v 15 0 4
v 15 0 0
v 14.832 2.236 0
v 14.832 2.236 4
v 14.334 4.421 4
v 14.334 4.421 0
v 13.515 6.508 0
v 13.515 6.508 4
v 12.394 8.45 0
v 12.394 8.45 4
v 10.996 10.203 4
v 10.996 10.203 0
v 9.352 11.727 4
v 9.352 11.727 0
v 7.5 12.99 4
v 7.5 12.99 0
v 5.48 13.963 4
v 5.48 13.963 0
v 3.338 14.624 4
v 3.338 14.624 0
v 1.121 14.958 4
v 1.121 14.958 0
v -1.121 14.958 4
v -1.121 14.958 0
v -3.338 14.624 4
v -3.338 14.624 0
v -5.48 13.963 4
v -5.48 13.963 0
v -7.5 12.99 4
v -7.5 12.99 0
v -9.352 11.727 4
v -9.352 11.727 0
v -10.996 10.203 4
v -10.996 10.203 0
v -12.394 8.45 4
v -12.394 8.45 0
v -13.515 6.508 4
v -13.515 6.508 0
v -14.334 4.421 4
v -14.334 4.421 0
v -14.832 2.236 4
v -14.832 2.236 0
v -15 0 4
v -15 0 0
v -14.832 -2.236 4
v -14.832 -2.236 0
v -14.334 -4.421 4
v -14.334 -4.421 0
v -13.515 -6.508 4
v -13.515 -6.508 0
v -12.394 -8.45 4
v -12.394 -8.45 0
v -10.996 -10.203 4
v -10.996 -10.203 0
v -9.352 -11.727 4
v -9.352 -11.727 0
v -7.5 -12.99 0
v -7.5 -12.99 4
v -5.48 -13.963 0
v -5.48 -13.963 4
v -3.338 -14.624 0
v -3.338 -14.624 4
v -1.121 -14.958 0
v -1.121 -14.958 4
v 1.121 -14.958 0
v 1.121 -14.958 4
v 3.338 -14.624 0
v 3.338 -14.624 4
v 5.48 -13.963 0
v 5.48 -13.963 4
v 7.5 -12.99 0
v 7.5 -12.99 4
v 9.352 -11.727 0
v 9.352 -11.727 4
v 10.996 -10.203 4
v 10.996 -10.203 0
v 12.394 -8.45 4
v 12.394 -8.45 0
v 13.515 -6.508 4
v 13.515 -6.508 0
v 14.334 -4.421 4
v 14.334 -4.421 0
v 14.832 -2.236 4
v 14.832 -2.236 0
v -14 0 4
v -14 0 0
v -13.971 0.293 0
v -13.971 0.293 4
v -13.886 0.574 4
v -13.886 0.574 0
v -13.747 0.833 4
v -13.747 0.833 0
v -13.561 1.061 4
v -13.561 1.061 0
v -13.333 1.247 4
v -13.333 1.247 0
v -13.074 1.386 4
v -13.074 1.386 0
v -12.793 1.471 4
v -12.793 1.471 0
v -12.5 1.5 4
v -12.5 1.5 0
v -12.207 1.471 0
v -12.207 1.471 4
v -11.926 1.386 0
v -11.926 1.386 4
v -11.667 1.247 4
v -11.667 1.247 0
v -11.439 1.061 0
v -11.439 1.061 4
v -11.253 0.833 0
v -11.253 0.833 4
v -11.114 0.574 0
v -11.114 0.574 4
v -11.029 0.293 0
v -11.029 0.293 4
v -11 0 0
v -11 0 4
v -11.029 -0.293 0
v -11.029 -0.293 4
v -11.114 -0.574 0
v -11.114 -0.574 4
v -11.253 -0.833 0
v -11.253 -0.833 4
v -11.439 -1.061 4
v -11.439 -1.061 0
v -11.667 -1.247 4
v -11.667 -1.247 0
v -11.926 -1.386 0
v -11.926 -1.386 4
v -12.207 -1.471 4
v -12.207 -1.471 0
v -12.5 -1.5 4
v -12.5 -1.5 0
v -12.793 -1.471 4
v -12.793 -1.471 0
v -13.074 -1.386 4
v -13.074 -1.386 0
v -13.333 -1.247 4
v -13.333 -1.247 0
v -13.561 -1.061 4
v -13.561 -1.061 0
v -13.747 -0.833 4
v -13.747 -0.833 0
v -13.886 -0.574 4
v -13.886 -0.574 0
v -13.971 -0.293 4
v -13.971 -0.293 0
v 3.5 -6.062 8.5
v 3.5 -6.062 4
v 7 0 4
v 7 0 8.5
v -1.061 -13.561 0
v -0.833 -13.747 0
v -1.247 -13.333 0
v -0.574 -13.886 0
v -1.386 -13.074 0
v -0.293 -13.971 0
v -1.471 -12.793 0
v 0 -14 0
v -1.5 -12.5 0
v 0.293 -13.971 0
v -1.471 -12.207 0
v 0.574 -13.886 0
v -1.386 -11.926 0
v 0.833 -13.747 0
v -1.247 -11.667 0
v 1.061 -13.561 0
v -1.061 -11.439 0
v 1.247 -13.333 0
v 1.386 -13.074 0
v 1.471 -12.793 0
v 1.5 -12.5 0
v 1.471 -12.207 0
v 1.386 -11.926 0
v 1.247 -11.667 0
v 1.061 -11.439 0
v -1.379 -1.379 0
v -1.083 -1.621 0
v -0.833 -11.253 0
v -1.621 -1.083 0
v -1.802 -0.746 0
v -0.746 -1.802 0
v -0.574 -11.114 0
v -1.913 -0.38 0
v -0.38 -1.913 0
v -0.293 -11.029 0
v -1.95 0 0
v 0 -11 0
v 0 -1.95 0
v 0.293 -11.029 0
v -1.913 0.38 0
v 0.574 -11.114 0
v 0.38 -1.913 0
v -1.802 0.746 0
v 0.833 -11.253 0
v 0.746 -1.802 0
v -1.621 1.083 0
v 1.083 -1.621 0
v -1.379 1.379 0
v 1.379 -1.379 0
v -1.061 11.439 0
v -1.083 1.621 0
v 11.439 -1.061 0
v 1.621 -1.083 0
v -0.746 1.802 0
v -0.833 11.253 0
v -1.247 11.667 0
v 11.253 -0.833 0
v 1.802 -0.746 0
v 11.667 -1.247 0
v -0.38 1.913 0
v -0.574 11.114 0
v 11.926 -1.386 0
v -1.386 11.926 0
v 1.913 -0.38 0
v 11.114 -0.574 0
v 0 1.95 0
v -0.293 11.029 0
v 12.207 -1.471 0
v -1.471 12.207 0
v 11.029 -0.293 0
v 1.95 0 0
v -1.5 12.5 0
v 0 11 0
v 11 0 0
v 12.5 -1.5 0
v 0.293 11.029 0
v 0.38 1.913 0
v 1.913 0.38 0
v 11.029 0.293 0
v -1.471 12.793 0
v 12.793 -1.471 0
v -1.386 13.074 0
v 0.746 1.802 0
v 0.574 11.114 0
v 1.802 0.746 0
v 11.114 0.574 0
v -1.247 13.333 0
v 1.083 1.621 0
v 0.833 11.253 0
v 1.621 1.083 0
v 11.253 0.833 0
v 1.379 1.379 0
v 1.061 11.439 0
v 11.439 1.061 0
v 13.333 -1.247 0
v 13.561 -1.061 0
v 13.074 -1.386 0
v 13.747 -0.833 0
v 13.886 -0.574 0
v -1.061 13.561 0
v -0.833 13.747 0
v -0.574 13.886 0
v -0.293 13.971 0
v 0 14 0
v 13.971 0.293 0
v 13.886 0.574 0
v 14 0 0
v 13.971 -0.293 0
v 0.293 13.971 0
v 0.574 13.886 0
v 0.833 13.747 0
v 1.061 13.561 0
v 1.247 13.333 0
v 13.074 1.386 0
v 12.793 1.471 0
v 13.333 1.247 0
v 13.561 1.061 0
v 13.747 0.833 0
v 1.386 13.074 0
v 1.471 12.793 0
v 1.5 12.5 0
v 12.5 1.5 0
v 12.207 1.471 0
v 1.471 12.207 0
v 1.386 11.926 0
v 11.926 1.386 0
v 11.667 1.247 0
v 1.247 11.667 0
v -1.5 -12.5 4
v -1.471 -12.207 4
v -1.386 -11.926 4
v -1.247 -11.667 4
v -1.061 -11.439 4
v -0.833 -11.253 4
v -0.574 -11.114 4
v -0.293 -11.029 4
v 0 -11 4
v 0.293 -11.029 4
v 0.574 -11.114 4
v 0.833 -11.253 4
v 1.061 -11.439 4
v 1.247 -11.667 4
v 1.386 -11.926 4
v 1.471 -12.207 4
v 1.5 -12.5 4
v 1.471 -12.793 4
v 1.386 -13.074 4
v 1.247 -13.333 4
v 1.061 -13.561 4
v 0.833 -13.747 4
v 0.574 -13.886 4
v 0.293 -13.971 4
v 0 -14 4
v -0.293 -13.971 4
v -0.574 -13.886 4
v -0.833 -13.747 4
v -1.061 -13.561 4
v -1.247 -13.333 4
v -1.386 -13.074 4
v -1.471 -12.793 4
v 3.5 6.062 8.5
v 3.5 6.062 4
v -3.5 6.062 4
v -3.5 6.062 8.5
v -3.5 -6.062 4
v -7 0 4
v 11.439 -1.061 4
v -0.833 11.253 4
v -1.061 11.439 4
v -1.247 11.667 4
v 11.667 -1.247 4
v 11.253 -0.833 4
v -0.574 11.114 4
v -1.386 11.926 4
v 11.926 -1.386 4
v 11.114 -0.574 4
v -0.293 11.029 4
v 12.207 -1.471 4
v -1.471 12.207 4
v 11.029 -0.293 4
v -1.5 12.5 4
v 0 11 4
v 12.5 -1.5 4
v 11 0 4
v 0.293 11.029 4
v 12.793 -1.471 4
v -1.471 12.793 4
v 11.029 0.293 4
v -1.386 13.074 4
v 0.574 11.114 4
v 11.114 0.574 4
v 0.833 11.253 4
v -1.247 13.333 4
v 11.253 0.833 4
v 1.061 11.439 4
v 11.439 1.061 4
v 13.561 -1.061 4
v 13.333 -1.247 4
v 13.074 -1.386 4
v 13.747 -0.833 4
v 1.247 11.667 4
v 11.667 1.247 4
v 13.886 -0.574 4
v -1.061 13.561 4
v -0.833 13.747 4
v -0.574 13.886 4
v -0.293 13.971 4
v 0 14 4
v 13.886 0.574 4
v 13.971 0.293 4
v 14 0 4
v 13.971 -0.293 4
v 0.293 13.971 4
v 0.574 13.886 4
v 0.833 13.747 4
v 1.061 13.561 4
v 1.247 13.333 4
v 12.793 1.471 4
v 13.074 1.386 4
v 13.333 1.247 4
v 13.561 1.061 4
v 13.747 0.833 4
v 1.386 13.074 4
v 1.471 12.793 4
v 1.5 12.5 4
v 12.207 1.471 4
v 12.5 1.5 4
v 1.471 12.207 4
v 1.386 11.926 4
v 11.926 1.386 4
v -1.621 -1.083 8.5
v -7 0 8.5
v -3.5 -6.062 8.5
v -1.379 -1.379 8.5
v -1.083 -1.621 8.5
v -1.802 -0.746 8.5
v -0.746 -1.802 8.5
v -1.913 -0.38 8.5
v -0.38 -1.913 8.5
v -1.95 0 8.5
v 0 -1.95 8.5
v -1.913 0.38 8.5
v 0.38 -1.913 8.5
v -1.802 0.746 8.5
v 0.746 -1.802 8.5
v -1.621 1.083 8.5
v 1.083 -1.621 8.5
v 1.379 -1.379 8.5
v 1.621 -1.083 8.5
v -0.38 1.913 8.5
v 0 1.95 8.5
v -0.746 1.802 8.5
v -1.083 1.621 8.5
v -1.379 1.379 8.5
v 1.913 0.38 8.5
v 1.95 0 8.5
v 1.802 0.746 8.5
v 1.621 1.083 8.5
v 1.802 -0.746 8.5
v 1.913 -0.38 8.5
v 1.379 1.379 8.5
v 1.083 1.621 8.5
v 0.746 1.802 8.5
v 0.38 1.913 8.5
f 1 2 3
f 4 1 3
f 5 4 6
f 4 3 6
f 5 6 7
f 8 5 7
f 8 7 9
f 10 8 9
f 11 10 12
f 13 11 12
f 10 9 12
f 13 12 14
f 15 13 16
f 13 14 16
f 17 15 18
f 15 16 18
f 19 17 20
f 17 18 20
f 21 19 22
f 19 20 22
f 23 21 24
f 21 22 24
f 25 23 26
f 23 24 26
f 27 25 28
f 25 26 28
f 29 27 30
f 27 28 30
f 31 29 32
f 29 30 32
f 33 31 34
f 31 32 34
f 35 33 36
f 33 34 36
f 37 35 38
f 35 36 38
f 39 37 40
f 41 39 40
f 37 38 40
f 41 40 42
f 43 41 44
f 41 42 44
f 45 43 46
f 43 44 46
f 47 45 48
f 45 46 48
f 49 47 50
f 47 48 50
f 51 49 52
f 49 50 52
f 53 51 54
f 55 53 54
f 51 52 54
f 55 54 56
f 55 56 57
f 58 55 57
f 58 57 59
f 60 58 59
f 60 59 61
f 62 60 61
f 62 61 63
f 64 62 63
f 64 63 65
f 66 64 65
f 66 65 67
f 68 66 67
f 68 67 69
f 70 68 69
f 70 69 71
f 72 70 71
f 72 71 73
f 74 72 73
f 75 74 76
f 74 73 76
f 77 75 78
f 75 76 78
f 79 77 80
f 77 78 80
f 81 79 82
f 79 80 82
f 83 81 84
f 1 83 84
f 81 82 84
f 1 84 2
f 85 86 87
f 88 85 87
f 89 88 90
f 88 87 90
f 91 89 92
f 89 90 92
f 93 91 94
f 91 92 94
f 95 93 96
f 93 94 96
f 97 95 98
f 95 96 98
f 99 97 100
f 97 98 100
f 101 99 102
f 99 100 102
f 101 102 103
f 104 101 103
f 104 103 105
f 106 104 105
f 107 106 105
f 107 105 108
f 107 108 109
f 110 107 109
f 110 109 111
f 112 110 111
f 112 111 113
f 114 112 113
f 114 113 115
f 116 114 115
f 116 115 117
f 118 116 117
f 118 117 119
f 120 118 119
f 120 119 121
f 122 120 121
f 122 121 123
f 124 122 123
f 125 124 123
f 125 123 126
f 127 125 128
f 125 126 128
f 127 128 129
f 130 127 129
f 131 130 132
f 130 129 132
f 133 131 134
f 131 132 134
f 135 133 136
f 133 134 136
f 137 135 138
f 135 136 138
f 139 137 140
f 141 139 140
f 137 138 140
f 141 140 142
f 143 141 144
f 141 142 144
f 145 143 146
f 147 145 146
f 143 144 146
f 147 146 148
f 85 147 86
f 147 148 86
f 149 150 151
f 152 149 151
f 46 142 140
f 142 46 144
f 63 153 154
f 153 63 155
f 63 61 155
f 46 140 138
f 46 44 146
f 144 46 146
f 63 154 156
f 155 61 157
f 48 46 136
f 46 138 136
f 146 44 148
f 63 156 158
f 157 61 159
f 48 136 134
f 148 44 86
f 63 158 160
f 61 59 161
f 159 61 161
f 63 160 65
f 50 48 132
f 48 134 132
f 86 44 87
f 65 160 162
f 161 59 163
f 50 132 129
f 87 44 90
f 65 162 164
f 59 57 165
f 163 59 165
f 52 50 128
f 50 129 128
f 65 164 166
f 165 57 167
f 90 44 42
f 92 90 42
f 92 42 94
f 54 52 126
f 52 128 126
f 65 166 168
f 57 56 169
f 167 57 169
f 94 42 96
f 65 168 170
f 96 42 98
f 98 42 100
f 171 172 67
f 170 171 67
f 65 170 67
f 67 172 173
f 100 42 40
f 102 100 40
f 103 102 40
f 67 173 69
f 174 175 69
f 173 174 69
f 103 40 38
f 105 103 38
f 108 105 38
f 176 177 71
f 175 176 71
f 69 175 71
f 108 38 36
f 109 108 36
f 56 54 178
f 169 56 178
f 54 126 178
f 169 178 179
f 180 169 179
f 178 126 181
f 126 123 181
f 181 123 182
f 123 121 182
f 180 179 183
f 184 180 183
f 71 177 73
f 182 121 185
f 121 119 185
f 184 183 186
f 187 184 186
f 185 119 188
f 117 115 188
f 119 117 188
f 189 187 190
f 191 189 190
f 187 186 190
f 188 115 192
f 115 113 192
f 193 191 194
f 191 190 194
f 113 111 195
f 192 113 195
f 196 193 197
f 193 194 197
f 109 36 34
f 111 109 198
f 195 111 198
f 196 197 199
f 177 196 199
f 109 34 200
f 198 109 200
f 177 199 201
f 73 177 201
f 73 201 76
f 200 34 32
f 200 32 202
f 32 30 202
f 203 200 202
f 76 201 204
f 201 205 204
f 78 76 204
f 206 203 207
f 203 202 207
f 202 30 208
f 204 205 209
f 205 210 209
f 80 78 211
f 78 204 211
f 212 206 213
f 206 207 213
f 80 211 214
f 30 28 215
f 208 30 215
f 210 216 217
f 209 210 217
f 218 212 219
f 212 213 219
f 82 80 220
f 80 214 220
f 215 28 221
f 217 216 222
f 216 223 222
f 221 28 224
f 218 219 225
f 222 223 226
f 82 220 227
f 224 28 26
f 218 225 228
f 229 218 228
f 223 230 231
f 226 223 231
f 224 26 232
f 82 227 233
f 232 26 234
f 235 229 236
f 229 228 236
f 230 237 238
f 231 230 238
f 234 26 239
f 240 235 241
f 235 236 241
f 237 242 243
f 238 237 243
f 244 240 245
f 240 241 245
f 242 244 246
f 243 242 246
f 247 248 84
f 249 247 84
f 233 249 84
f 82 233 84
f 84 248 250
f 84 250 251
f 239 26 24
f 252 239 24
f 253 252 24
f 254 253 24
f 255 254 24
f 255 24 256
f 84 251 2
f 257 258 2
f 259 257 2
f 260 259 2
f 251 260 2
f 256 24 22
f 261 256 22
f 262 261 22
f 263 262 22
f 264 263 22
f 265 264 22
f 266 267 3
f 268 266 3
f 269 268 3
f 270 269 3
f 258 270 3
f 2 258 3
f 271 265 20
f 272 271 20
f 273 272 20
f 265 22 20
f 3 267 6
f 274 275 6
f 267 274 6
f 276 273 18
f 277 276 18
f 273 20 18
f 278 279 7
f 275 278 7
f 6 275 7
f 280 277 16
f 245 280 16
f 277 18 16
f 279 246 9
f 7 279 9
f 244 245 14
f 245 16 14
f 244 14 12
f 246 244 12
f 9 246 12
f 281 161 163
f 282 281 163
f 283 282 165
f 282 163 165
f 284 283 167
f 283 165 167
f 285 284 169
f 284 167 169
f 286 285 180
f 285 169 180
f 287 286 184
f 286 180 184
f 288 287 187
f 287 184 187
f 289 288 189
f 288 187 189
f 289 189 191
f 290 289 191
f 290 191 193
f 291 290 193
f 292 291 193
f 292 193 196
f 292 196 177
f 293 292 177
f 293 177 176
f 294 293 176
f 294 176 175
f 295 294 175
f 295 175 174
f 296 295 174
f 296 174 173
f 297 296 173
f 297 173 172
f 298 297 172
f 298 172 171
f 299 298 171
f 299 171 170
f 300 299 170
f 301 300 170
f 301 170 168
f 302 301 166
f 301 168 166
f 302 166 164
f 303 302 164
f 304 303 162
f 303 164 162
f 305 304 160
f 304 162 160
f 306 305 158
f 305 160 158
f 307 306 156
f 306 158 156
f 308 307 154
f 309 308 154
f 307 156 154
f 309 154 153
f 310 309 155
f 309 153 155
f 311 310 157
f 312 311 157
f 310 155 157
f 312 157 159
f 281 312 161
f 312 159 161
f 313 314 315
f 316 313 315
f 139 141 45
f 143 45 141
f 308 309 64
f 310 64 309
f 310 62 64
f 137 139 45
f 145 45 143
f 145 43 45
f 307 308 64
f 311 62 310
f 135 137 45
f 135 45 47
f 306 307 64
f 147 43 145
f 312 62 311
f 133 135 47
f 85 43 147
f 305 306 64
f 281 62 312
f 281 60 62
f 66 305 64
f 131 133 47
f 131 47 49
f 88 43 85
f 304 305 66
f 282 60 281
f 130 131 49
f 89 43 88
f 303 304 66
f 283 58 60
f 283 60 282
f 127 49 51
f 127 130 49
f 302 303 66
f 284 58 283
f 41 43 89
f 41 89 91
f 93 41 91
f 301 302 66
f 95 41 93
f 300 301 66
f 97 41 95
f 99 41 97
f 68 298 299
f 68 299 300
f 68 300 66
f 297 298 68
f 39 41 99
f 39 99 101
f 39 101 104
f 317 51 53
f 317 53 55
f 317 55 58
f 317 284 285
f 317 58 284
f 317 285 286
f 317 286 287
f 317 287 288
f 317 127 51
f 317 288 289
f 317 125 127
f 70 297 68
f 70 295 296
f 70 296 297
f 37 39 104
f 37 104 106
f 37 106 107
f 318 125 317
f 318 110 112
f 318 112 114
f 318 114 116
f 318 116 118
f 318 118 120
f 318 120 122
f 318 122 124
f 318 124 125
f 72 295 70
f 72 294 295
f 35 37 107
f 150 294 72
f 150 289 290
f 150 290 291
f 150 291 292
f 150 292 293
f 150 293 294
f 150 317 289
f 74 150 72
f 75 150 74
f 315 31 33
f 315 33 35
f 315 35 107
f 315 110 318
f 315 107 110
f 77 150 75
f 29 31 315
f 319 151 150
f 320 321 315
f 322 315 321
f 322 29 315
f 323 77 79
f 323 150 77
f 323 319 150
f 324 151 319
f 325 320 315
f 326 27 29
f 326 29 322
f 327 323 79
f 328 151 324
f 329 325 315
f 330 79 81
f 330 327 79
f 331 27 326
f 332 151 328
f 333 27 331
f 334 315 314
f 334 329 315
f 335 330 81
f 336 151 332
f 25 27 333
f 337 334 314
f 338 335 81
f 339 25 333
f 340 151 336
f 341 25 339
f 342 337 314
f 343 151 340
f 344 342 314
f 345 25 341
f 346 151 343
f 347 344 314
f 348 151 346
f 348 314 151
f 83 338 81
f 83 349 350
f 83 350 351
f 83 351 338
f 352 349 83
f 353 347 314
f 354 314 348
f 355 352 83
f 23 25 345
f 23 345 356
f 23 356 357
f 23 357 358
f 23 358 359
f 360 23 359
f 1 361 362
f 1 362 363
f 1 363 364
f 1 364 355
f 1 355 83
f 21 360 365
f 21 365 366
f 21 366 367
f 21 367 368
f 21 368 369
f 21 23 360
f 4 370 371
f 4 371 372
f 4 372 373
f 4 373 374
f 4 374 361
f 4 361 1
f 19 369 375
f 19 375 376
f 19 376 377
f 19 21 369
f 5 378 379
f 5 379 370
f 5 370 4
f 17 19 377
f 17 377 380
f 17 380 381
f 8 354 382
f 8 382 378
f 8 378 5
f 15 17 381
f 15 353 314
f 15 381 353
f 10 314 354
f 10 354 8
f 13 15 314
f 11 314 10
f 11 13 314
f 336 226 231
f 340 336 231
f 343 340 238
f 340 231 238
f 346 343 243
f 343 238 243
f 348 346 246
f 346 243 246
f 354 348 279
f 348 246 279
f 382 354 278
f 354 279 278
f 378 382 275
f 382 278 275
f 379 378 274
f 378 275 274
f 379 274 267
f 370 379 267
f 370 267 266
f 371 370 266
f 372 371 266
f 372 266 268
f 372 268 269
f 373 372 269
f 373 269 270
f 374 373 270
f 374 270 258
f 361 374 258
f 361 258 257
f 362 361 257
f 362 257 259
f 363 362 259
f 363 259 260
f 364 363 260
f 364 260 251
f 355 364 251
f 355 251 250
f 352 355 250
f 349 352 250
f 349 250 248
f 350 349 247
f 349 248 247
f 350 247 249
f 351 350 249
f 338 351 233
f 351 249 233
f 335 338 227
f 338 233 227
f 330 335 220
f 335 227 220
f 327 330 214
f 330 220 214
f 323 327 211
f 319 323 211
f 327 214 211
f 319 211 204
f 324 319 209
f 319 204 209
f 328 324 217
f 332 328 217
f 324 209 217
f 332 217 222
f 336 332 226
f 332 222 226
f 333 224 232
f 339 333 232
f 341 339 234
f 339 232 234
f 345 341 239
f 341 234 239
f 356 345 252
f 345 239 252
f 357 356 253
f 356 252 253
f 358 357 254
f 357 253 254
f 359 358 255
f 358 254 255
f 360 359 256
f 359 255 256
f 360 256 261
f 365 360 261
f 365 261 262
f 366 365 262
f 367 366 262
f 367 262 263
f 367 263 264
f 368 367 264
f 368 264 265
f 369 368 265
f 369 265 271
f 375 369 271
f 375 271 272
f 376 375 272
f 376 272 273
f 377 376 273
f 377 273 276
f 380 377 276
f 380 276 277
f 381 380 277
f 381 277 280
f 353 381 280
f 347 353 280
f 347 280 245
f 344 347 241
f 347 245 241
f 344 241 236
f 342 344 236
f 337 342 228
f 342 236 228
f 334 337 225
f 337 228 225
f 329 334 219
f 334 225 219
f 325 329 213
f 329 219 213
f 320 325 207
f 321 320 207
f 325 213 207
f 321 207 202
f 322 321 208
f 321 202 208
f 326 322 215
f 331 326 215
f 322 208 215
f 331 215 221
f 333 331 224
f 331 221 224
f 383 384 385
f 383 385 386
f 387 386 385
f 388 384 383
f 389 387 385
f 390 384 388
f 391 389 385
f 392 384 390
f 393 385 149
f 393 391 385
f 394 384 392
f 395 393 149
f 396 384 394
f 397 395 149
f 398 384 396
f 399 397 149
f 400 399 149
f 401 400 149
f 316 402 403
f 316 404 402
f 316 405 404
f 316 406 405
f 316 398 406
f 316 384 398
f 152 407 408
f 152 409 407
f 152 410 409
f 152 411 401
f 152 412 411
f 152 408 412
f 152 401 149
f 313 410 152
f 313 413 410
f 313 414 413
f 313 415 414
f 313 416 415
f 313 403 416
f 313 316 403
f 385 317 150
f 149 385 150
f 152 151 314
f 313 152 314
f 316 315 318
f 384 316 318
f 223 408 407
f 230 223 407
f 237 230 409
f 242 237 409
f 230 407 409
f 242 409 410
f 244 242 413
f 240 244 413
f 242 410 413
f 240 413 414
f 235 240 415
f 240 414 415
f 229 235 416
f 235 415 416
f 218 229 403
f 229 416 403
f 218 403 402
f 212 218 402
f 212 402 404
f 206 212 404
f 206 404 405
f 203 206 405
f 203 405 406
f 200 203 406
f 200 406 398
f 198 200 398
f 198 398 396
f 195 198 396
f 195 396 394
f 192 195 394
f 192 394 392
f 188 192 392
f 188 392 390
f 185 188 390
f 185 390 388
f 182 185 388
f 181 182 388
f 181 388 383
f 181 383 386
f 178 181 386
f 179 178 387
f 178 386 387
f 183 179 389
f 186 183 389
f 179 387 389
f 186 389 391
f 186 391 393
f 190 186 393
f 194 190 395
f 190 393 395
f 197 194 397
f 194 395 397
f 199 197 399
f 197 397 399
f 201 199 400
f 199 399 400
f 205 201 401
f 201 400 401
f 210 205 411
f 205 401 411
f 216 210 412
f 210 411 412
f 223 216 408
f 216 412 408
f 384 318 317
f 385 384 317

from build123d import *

# Parameters (mm, degrees)
SKETCH_1_R          = 15
EXTRUDE_1_DEPTH     = 4
EXTRUDE_2_DEPTH     = 4.5
SKETCH_3_R          = 1.95
CUT_EXTRUDE_1_DEPTH = 23.852789764
SKETCH_6_R          = 1.5
CUT_EXTRUDE_2_DEPTH = 23.852789764


with BuildPart() as part:
    # 草图1 → 凸台-拉伸1 (new body)
    with BuildSketch(Plane.XY):
        Circle(SKETCH_1_R)
    extrude(amount=EXTRUDE_1_DEPTH)

    # 草图2 → 凸台-拉伸2 (add)
    with BuildSketch(Plane.XY.offset(4)):
        Polygon((3.5, 6.062177826), (-3.5, 6.062177826), (-7, 0), (-3.5, -6.062177826), (3.5, -6.062177826), (7, 0), align=None)
    extrude(amount=EXTRUDE_2_DEPTH)

    # 草图3 → 切除-拉伸1 (cut, through all)
    with BuildSketch(Plane.XY.offset(8.5)):
        Circle(SKETCH_3_R)
    extrude(amount=-CUT_EXTRUDE_1_DEPTH, mode=Mode.SUBTRACT)

    # 草图6 → 切除-拉伸2 (cut, through all)
    with BuildSketch(Plane(origin=(0, 0, 0), x_dir=(-1, 0, 0), z_dir=(0, 0, -1))):
        with Locations((0, 12.5)):
            Circle(SKETCH_6_R)
        with Locations((12.5, 0)):
            Circle(SKETCH_6_R)
        with Locations((0, -12.5)):
            Circle(SKETCH_6_R)
        with Locations((-12.5, 0)):
            Circle(SKETCH_6_R)
    extrude(amount=-CUT_EXTRUDE_2_DEPTH, mode=Mode.SUBTRACT)


solid = part.part
